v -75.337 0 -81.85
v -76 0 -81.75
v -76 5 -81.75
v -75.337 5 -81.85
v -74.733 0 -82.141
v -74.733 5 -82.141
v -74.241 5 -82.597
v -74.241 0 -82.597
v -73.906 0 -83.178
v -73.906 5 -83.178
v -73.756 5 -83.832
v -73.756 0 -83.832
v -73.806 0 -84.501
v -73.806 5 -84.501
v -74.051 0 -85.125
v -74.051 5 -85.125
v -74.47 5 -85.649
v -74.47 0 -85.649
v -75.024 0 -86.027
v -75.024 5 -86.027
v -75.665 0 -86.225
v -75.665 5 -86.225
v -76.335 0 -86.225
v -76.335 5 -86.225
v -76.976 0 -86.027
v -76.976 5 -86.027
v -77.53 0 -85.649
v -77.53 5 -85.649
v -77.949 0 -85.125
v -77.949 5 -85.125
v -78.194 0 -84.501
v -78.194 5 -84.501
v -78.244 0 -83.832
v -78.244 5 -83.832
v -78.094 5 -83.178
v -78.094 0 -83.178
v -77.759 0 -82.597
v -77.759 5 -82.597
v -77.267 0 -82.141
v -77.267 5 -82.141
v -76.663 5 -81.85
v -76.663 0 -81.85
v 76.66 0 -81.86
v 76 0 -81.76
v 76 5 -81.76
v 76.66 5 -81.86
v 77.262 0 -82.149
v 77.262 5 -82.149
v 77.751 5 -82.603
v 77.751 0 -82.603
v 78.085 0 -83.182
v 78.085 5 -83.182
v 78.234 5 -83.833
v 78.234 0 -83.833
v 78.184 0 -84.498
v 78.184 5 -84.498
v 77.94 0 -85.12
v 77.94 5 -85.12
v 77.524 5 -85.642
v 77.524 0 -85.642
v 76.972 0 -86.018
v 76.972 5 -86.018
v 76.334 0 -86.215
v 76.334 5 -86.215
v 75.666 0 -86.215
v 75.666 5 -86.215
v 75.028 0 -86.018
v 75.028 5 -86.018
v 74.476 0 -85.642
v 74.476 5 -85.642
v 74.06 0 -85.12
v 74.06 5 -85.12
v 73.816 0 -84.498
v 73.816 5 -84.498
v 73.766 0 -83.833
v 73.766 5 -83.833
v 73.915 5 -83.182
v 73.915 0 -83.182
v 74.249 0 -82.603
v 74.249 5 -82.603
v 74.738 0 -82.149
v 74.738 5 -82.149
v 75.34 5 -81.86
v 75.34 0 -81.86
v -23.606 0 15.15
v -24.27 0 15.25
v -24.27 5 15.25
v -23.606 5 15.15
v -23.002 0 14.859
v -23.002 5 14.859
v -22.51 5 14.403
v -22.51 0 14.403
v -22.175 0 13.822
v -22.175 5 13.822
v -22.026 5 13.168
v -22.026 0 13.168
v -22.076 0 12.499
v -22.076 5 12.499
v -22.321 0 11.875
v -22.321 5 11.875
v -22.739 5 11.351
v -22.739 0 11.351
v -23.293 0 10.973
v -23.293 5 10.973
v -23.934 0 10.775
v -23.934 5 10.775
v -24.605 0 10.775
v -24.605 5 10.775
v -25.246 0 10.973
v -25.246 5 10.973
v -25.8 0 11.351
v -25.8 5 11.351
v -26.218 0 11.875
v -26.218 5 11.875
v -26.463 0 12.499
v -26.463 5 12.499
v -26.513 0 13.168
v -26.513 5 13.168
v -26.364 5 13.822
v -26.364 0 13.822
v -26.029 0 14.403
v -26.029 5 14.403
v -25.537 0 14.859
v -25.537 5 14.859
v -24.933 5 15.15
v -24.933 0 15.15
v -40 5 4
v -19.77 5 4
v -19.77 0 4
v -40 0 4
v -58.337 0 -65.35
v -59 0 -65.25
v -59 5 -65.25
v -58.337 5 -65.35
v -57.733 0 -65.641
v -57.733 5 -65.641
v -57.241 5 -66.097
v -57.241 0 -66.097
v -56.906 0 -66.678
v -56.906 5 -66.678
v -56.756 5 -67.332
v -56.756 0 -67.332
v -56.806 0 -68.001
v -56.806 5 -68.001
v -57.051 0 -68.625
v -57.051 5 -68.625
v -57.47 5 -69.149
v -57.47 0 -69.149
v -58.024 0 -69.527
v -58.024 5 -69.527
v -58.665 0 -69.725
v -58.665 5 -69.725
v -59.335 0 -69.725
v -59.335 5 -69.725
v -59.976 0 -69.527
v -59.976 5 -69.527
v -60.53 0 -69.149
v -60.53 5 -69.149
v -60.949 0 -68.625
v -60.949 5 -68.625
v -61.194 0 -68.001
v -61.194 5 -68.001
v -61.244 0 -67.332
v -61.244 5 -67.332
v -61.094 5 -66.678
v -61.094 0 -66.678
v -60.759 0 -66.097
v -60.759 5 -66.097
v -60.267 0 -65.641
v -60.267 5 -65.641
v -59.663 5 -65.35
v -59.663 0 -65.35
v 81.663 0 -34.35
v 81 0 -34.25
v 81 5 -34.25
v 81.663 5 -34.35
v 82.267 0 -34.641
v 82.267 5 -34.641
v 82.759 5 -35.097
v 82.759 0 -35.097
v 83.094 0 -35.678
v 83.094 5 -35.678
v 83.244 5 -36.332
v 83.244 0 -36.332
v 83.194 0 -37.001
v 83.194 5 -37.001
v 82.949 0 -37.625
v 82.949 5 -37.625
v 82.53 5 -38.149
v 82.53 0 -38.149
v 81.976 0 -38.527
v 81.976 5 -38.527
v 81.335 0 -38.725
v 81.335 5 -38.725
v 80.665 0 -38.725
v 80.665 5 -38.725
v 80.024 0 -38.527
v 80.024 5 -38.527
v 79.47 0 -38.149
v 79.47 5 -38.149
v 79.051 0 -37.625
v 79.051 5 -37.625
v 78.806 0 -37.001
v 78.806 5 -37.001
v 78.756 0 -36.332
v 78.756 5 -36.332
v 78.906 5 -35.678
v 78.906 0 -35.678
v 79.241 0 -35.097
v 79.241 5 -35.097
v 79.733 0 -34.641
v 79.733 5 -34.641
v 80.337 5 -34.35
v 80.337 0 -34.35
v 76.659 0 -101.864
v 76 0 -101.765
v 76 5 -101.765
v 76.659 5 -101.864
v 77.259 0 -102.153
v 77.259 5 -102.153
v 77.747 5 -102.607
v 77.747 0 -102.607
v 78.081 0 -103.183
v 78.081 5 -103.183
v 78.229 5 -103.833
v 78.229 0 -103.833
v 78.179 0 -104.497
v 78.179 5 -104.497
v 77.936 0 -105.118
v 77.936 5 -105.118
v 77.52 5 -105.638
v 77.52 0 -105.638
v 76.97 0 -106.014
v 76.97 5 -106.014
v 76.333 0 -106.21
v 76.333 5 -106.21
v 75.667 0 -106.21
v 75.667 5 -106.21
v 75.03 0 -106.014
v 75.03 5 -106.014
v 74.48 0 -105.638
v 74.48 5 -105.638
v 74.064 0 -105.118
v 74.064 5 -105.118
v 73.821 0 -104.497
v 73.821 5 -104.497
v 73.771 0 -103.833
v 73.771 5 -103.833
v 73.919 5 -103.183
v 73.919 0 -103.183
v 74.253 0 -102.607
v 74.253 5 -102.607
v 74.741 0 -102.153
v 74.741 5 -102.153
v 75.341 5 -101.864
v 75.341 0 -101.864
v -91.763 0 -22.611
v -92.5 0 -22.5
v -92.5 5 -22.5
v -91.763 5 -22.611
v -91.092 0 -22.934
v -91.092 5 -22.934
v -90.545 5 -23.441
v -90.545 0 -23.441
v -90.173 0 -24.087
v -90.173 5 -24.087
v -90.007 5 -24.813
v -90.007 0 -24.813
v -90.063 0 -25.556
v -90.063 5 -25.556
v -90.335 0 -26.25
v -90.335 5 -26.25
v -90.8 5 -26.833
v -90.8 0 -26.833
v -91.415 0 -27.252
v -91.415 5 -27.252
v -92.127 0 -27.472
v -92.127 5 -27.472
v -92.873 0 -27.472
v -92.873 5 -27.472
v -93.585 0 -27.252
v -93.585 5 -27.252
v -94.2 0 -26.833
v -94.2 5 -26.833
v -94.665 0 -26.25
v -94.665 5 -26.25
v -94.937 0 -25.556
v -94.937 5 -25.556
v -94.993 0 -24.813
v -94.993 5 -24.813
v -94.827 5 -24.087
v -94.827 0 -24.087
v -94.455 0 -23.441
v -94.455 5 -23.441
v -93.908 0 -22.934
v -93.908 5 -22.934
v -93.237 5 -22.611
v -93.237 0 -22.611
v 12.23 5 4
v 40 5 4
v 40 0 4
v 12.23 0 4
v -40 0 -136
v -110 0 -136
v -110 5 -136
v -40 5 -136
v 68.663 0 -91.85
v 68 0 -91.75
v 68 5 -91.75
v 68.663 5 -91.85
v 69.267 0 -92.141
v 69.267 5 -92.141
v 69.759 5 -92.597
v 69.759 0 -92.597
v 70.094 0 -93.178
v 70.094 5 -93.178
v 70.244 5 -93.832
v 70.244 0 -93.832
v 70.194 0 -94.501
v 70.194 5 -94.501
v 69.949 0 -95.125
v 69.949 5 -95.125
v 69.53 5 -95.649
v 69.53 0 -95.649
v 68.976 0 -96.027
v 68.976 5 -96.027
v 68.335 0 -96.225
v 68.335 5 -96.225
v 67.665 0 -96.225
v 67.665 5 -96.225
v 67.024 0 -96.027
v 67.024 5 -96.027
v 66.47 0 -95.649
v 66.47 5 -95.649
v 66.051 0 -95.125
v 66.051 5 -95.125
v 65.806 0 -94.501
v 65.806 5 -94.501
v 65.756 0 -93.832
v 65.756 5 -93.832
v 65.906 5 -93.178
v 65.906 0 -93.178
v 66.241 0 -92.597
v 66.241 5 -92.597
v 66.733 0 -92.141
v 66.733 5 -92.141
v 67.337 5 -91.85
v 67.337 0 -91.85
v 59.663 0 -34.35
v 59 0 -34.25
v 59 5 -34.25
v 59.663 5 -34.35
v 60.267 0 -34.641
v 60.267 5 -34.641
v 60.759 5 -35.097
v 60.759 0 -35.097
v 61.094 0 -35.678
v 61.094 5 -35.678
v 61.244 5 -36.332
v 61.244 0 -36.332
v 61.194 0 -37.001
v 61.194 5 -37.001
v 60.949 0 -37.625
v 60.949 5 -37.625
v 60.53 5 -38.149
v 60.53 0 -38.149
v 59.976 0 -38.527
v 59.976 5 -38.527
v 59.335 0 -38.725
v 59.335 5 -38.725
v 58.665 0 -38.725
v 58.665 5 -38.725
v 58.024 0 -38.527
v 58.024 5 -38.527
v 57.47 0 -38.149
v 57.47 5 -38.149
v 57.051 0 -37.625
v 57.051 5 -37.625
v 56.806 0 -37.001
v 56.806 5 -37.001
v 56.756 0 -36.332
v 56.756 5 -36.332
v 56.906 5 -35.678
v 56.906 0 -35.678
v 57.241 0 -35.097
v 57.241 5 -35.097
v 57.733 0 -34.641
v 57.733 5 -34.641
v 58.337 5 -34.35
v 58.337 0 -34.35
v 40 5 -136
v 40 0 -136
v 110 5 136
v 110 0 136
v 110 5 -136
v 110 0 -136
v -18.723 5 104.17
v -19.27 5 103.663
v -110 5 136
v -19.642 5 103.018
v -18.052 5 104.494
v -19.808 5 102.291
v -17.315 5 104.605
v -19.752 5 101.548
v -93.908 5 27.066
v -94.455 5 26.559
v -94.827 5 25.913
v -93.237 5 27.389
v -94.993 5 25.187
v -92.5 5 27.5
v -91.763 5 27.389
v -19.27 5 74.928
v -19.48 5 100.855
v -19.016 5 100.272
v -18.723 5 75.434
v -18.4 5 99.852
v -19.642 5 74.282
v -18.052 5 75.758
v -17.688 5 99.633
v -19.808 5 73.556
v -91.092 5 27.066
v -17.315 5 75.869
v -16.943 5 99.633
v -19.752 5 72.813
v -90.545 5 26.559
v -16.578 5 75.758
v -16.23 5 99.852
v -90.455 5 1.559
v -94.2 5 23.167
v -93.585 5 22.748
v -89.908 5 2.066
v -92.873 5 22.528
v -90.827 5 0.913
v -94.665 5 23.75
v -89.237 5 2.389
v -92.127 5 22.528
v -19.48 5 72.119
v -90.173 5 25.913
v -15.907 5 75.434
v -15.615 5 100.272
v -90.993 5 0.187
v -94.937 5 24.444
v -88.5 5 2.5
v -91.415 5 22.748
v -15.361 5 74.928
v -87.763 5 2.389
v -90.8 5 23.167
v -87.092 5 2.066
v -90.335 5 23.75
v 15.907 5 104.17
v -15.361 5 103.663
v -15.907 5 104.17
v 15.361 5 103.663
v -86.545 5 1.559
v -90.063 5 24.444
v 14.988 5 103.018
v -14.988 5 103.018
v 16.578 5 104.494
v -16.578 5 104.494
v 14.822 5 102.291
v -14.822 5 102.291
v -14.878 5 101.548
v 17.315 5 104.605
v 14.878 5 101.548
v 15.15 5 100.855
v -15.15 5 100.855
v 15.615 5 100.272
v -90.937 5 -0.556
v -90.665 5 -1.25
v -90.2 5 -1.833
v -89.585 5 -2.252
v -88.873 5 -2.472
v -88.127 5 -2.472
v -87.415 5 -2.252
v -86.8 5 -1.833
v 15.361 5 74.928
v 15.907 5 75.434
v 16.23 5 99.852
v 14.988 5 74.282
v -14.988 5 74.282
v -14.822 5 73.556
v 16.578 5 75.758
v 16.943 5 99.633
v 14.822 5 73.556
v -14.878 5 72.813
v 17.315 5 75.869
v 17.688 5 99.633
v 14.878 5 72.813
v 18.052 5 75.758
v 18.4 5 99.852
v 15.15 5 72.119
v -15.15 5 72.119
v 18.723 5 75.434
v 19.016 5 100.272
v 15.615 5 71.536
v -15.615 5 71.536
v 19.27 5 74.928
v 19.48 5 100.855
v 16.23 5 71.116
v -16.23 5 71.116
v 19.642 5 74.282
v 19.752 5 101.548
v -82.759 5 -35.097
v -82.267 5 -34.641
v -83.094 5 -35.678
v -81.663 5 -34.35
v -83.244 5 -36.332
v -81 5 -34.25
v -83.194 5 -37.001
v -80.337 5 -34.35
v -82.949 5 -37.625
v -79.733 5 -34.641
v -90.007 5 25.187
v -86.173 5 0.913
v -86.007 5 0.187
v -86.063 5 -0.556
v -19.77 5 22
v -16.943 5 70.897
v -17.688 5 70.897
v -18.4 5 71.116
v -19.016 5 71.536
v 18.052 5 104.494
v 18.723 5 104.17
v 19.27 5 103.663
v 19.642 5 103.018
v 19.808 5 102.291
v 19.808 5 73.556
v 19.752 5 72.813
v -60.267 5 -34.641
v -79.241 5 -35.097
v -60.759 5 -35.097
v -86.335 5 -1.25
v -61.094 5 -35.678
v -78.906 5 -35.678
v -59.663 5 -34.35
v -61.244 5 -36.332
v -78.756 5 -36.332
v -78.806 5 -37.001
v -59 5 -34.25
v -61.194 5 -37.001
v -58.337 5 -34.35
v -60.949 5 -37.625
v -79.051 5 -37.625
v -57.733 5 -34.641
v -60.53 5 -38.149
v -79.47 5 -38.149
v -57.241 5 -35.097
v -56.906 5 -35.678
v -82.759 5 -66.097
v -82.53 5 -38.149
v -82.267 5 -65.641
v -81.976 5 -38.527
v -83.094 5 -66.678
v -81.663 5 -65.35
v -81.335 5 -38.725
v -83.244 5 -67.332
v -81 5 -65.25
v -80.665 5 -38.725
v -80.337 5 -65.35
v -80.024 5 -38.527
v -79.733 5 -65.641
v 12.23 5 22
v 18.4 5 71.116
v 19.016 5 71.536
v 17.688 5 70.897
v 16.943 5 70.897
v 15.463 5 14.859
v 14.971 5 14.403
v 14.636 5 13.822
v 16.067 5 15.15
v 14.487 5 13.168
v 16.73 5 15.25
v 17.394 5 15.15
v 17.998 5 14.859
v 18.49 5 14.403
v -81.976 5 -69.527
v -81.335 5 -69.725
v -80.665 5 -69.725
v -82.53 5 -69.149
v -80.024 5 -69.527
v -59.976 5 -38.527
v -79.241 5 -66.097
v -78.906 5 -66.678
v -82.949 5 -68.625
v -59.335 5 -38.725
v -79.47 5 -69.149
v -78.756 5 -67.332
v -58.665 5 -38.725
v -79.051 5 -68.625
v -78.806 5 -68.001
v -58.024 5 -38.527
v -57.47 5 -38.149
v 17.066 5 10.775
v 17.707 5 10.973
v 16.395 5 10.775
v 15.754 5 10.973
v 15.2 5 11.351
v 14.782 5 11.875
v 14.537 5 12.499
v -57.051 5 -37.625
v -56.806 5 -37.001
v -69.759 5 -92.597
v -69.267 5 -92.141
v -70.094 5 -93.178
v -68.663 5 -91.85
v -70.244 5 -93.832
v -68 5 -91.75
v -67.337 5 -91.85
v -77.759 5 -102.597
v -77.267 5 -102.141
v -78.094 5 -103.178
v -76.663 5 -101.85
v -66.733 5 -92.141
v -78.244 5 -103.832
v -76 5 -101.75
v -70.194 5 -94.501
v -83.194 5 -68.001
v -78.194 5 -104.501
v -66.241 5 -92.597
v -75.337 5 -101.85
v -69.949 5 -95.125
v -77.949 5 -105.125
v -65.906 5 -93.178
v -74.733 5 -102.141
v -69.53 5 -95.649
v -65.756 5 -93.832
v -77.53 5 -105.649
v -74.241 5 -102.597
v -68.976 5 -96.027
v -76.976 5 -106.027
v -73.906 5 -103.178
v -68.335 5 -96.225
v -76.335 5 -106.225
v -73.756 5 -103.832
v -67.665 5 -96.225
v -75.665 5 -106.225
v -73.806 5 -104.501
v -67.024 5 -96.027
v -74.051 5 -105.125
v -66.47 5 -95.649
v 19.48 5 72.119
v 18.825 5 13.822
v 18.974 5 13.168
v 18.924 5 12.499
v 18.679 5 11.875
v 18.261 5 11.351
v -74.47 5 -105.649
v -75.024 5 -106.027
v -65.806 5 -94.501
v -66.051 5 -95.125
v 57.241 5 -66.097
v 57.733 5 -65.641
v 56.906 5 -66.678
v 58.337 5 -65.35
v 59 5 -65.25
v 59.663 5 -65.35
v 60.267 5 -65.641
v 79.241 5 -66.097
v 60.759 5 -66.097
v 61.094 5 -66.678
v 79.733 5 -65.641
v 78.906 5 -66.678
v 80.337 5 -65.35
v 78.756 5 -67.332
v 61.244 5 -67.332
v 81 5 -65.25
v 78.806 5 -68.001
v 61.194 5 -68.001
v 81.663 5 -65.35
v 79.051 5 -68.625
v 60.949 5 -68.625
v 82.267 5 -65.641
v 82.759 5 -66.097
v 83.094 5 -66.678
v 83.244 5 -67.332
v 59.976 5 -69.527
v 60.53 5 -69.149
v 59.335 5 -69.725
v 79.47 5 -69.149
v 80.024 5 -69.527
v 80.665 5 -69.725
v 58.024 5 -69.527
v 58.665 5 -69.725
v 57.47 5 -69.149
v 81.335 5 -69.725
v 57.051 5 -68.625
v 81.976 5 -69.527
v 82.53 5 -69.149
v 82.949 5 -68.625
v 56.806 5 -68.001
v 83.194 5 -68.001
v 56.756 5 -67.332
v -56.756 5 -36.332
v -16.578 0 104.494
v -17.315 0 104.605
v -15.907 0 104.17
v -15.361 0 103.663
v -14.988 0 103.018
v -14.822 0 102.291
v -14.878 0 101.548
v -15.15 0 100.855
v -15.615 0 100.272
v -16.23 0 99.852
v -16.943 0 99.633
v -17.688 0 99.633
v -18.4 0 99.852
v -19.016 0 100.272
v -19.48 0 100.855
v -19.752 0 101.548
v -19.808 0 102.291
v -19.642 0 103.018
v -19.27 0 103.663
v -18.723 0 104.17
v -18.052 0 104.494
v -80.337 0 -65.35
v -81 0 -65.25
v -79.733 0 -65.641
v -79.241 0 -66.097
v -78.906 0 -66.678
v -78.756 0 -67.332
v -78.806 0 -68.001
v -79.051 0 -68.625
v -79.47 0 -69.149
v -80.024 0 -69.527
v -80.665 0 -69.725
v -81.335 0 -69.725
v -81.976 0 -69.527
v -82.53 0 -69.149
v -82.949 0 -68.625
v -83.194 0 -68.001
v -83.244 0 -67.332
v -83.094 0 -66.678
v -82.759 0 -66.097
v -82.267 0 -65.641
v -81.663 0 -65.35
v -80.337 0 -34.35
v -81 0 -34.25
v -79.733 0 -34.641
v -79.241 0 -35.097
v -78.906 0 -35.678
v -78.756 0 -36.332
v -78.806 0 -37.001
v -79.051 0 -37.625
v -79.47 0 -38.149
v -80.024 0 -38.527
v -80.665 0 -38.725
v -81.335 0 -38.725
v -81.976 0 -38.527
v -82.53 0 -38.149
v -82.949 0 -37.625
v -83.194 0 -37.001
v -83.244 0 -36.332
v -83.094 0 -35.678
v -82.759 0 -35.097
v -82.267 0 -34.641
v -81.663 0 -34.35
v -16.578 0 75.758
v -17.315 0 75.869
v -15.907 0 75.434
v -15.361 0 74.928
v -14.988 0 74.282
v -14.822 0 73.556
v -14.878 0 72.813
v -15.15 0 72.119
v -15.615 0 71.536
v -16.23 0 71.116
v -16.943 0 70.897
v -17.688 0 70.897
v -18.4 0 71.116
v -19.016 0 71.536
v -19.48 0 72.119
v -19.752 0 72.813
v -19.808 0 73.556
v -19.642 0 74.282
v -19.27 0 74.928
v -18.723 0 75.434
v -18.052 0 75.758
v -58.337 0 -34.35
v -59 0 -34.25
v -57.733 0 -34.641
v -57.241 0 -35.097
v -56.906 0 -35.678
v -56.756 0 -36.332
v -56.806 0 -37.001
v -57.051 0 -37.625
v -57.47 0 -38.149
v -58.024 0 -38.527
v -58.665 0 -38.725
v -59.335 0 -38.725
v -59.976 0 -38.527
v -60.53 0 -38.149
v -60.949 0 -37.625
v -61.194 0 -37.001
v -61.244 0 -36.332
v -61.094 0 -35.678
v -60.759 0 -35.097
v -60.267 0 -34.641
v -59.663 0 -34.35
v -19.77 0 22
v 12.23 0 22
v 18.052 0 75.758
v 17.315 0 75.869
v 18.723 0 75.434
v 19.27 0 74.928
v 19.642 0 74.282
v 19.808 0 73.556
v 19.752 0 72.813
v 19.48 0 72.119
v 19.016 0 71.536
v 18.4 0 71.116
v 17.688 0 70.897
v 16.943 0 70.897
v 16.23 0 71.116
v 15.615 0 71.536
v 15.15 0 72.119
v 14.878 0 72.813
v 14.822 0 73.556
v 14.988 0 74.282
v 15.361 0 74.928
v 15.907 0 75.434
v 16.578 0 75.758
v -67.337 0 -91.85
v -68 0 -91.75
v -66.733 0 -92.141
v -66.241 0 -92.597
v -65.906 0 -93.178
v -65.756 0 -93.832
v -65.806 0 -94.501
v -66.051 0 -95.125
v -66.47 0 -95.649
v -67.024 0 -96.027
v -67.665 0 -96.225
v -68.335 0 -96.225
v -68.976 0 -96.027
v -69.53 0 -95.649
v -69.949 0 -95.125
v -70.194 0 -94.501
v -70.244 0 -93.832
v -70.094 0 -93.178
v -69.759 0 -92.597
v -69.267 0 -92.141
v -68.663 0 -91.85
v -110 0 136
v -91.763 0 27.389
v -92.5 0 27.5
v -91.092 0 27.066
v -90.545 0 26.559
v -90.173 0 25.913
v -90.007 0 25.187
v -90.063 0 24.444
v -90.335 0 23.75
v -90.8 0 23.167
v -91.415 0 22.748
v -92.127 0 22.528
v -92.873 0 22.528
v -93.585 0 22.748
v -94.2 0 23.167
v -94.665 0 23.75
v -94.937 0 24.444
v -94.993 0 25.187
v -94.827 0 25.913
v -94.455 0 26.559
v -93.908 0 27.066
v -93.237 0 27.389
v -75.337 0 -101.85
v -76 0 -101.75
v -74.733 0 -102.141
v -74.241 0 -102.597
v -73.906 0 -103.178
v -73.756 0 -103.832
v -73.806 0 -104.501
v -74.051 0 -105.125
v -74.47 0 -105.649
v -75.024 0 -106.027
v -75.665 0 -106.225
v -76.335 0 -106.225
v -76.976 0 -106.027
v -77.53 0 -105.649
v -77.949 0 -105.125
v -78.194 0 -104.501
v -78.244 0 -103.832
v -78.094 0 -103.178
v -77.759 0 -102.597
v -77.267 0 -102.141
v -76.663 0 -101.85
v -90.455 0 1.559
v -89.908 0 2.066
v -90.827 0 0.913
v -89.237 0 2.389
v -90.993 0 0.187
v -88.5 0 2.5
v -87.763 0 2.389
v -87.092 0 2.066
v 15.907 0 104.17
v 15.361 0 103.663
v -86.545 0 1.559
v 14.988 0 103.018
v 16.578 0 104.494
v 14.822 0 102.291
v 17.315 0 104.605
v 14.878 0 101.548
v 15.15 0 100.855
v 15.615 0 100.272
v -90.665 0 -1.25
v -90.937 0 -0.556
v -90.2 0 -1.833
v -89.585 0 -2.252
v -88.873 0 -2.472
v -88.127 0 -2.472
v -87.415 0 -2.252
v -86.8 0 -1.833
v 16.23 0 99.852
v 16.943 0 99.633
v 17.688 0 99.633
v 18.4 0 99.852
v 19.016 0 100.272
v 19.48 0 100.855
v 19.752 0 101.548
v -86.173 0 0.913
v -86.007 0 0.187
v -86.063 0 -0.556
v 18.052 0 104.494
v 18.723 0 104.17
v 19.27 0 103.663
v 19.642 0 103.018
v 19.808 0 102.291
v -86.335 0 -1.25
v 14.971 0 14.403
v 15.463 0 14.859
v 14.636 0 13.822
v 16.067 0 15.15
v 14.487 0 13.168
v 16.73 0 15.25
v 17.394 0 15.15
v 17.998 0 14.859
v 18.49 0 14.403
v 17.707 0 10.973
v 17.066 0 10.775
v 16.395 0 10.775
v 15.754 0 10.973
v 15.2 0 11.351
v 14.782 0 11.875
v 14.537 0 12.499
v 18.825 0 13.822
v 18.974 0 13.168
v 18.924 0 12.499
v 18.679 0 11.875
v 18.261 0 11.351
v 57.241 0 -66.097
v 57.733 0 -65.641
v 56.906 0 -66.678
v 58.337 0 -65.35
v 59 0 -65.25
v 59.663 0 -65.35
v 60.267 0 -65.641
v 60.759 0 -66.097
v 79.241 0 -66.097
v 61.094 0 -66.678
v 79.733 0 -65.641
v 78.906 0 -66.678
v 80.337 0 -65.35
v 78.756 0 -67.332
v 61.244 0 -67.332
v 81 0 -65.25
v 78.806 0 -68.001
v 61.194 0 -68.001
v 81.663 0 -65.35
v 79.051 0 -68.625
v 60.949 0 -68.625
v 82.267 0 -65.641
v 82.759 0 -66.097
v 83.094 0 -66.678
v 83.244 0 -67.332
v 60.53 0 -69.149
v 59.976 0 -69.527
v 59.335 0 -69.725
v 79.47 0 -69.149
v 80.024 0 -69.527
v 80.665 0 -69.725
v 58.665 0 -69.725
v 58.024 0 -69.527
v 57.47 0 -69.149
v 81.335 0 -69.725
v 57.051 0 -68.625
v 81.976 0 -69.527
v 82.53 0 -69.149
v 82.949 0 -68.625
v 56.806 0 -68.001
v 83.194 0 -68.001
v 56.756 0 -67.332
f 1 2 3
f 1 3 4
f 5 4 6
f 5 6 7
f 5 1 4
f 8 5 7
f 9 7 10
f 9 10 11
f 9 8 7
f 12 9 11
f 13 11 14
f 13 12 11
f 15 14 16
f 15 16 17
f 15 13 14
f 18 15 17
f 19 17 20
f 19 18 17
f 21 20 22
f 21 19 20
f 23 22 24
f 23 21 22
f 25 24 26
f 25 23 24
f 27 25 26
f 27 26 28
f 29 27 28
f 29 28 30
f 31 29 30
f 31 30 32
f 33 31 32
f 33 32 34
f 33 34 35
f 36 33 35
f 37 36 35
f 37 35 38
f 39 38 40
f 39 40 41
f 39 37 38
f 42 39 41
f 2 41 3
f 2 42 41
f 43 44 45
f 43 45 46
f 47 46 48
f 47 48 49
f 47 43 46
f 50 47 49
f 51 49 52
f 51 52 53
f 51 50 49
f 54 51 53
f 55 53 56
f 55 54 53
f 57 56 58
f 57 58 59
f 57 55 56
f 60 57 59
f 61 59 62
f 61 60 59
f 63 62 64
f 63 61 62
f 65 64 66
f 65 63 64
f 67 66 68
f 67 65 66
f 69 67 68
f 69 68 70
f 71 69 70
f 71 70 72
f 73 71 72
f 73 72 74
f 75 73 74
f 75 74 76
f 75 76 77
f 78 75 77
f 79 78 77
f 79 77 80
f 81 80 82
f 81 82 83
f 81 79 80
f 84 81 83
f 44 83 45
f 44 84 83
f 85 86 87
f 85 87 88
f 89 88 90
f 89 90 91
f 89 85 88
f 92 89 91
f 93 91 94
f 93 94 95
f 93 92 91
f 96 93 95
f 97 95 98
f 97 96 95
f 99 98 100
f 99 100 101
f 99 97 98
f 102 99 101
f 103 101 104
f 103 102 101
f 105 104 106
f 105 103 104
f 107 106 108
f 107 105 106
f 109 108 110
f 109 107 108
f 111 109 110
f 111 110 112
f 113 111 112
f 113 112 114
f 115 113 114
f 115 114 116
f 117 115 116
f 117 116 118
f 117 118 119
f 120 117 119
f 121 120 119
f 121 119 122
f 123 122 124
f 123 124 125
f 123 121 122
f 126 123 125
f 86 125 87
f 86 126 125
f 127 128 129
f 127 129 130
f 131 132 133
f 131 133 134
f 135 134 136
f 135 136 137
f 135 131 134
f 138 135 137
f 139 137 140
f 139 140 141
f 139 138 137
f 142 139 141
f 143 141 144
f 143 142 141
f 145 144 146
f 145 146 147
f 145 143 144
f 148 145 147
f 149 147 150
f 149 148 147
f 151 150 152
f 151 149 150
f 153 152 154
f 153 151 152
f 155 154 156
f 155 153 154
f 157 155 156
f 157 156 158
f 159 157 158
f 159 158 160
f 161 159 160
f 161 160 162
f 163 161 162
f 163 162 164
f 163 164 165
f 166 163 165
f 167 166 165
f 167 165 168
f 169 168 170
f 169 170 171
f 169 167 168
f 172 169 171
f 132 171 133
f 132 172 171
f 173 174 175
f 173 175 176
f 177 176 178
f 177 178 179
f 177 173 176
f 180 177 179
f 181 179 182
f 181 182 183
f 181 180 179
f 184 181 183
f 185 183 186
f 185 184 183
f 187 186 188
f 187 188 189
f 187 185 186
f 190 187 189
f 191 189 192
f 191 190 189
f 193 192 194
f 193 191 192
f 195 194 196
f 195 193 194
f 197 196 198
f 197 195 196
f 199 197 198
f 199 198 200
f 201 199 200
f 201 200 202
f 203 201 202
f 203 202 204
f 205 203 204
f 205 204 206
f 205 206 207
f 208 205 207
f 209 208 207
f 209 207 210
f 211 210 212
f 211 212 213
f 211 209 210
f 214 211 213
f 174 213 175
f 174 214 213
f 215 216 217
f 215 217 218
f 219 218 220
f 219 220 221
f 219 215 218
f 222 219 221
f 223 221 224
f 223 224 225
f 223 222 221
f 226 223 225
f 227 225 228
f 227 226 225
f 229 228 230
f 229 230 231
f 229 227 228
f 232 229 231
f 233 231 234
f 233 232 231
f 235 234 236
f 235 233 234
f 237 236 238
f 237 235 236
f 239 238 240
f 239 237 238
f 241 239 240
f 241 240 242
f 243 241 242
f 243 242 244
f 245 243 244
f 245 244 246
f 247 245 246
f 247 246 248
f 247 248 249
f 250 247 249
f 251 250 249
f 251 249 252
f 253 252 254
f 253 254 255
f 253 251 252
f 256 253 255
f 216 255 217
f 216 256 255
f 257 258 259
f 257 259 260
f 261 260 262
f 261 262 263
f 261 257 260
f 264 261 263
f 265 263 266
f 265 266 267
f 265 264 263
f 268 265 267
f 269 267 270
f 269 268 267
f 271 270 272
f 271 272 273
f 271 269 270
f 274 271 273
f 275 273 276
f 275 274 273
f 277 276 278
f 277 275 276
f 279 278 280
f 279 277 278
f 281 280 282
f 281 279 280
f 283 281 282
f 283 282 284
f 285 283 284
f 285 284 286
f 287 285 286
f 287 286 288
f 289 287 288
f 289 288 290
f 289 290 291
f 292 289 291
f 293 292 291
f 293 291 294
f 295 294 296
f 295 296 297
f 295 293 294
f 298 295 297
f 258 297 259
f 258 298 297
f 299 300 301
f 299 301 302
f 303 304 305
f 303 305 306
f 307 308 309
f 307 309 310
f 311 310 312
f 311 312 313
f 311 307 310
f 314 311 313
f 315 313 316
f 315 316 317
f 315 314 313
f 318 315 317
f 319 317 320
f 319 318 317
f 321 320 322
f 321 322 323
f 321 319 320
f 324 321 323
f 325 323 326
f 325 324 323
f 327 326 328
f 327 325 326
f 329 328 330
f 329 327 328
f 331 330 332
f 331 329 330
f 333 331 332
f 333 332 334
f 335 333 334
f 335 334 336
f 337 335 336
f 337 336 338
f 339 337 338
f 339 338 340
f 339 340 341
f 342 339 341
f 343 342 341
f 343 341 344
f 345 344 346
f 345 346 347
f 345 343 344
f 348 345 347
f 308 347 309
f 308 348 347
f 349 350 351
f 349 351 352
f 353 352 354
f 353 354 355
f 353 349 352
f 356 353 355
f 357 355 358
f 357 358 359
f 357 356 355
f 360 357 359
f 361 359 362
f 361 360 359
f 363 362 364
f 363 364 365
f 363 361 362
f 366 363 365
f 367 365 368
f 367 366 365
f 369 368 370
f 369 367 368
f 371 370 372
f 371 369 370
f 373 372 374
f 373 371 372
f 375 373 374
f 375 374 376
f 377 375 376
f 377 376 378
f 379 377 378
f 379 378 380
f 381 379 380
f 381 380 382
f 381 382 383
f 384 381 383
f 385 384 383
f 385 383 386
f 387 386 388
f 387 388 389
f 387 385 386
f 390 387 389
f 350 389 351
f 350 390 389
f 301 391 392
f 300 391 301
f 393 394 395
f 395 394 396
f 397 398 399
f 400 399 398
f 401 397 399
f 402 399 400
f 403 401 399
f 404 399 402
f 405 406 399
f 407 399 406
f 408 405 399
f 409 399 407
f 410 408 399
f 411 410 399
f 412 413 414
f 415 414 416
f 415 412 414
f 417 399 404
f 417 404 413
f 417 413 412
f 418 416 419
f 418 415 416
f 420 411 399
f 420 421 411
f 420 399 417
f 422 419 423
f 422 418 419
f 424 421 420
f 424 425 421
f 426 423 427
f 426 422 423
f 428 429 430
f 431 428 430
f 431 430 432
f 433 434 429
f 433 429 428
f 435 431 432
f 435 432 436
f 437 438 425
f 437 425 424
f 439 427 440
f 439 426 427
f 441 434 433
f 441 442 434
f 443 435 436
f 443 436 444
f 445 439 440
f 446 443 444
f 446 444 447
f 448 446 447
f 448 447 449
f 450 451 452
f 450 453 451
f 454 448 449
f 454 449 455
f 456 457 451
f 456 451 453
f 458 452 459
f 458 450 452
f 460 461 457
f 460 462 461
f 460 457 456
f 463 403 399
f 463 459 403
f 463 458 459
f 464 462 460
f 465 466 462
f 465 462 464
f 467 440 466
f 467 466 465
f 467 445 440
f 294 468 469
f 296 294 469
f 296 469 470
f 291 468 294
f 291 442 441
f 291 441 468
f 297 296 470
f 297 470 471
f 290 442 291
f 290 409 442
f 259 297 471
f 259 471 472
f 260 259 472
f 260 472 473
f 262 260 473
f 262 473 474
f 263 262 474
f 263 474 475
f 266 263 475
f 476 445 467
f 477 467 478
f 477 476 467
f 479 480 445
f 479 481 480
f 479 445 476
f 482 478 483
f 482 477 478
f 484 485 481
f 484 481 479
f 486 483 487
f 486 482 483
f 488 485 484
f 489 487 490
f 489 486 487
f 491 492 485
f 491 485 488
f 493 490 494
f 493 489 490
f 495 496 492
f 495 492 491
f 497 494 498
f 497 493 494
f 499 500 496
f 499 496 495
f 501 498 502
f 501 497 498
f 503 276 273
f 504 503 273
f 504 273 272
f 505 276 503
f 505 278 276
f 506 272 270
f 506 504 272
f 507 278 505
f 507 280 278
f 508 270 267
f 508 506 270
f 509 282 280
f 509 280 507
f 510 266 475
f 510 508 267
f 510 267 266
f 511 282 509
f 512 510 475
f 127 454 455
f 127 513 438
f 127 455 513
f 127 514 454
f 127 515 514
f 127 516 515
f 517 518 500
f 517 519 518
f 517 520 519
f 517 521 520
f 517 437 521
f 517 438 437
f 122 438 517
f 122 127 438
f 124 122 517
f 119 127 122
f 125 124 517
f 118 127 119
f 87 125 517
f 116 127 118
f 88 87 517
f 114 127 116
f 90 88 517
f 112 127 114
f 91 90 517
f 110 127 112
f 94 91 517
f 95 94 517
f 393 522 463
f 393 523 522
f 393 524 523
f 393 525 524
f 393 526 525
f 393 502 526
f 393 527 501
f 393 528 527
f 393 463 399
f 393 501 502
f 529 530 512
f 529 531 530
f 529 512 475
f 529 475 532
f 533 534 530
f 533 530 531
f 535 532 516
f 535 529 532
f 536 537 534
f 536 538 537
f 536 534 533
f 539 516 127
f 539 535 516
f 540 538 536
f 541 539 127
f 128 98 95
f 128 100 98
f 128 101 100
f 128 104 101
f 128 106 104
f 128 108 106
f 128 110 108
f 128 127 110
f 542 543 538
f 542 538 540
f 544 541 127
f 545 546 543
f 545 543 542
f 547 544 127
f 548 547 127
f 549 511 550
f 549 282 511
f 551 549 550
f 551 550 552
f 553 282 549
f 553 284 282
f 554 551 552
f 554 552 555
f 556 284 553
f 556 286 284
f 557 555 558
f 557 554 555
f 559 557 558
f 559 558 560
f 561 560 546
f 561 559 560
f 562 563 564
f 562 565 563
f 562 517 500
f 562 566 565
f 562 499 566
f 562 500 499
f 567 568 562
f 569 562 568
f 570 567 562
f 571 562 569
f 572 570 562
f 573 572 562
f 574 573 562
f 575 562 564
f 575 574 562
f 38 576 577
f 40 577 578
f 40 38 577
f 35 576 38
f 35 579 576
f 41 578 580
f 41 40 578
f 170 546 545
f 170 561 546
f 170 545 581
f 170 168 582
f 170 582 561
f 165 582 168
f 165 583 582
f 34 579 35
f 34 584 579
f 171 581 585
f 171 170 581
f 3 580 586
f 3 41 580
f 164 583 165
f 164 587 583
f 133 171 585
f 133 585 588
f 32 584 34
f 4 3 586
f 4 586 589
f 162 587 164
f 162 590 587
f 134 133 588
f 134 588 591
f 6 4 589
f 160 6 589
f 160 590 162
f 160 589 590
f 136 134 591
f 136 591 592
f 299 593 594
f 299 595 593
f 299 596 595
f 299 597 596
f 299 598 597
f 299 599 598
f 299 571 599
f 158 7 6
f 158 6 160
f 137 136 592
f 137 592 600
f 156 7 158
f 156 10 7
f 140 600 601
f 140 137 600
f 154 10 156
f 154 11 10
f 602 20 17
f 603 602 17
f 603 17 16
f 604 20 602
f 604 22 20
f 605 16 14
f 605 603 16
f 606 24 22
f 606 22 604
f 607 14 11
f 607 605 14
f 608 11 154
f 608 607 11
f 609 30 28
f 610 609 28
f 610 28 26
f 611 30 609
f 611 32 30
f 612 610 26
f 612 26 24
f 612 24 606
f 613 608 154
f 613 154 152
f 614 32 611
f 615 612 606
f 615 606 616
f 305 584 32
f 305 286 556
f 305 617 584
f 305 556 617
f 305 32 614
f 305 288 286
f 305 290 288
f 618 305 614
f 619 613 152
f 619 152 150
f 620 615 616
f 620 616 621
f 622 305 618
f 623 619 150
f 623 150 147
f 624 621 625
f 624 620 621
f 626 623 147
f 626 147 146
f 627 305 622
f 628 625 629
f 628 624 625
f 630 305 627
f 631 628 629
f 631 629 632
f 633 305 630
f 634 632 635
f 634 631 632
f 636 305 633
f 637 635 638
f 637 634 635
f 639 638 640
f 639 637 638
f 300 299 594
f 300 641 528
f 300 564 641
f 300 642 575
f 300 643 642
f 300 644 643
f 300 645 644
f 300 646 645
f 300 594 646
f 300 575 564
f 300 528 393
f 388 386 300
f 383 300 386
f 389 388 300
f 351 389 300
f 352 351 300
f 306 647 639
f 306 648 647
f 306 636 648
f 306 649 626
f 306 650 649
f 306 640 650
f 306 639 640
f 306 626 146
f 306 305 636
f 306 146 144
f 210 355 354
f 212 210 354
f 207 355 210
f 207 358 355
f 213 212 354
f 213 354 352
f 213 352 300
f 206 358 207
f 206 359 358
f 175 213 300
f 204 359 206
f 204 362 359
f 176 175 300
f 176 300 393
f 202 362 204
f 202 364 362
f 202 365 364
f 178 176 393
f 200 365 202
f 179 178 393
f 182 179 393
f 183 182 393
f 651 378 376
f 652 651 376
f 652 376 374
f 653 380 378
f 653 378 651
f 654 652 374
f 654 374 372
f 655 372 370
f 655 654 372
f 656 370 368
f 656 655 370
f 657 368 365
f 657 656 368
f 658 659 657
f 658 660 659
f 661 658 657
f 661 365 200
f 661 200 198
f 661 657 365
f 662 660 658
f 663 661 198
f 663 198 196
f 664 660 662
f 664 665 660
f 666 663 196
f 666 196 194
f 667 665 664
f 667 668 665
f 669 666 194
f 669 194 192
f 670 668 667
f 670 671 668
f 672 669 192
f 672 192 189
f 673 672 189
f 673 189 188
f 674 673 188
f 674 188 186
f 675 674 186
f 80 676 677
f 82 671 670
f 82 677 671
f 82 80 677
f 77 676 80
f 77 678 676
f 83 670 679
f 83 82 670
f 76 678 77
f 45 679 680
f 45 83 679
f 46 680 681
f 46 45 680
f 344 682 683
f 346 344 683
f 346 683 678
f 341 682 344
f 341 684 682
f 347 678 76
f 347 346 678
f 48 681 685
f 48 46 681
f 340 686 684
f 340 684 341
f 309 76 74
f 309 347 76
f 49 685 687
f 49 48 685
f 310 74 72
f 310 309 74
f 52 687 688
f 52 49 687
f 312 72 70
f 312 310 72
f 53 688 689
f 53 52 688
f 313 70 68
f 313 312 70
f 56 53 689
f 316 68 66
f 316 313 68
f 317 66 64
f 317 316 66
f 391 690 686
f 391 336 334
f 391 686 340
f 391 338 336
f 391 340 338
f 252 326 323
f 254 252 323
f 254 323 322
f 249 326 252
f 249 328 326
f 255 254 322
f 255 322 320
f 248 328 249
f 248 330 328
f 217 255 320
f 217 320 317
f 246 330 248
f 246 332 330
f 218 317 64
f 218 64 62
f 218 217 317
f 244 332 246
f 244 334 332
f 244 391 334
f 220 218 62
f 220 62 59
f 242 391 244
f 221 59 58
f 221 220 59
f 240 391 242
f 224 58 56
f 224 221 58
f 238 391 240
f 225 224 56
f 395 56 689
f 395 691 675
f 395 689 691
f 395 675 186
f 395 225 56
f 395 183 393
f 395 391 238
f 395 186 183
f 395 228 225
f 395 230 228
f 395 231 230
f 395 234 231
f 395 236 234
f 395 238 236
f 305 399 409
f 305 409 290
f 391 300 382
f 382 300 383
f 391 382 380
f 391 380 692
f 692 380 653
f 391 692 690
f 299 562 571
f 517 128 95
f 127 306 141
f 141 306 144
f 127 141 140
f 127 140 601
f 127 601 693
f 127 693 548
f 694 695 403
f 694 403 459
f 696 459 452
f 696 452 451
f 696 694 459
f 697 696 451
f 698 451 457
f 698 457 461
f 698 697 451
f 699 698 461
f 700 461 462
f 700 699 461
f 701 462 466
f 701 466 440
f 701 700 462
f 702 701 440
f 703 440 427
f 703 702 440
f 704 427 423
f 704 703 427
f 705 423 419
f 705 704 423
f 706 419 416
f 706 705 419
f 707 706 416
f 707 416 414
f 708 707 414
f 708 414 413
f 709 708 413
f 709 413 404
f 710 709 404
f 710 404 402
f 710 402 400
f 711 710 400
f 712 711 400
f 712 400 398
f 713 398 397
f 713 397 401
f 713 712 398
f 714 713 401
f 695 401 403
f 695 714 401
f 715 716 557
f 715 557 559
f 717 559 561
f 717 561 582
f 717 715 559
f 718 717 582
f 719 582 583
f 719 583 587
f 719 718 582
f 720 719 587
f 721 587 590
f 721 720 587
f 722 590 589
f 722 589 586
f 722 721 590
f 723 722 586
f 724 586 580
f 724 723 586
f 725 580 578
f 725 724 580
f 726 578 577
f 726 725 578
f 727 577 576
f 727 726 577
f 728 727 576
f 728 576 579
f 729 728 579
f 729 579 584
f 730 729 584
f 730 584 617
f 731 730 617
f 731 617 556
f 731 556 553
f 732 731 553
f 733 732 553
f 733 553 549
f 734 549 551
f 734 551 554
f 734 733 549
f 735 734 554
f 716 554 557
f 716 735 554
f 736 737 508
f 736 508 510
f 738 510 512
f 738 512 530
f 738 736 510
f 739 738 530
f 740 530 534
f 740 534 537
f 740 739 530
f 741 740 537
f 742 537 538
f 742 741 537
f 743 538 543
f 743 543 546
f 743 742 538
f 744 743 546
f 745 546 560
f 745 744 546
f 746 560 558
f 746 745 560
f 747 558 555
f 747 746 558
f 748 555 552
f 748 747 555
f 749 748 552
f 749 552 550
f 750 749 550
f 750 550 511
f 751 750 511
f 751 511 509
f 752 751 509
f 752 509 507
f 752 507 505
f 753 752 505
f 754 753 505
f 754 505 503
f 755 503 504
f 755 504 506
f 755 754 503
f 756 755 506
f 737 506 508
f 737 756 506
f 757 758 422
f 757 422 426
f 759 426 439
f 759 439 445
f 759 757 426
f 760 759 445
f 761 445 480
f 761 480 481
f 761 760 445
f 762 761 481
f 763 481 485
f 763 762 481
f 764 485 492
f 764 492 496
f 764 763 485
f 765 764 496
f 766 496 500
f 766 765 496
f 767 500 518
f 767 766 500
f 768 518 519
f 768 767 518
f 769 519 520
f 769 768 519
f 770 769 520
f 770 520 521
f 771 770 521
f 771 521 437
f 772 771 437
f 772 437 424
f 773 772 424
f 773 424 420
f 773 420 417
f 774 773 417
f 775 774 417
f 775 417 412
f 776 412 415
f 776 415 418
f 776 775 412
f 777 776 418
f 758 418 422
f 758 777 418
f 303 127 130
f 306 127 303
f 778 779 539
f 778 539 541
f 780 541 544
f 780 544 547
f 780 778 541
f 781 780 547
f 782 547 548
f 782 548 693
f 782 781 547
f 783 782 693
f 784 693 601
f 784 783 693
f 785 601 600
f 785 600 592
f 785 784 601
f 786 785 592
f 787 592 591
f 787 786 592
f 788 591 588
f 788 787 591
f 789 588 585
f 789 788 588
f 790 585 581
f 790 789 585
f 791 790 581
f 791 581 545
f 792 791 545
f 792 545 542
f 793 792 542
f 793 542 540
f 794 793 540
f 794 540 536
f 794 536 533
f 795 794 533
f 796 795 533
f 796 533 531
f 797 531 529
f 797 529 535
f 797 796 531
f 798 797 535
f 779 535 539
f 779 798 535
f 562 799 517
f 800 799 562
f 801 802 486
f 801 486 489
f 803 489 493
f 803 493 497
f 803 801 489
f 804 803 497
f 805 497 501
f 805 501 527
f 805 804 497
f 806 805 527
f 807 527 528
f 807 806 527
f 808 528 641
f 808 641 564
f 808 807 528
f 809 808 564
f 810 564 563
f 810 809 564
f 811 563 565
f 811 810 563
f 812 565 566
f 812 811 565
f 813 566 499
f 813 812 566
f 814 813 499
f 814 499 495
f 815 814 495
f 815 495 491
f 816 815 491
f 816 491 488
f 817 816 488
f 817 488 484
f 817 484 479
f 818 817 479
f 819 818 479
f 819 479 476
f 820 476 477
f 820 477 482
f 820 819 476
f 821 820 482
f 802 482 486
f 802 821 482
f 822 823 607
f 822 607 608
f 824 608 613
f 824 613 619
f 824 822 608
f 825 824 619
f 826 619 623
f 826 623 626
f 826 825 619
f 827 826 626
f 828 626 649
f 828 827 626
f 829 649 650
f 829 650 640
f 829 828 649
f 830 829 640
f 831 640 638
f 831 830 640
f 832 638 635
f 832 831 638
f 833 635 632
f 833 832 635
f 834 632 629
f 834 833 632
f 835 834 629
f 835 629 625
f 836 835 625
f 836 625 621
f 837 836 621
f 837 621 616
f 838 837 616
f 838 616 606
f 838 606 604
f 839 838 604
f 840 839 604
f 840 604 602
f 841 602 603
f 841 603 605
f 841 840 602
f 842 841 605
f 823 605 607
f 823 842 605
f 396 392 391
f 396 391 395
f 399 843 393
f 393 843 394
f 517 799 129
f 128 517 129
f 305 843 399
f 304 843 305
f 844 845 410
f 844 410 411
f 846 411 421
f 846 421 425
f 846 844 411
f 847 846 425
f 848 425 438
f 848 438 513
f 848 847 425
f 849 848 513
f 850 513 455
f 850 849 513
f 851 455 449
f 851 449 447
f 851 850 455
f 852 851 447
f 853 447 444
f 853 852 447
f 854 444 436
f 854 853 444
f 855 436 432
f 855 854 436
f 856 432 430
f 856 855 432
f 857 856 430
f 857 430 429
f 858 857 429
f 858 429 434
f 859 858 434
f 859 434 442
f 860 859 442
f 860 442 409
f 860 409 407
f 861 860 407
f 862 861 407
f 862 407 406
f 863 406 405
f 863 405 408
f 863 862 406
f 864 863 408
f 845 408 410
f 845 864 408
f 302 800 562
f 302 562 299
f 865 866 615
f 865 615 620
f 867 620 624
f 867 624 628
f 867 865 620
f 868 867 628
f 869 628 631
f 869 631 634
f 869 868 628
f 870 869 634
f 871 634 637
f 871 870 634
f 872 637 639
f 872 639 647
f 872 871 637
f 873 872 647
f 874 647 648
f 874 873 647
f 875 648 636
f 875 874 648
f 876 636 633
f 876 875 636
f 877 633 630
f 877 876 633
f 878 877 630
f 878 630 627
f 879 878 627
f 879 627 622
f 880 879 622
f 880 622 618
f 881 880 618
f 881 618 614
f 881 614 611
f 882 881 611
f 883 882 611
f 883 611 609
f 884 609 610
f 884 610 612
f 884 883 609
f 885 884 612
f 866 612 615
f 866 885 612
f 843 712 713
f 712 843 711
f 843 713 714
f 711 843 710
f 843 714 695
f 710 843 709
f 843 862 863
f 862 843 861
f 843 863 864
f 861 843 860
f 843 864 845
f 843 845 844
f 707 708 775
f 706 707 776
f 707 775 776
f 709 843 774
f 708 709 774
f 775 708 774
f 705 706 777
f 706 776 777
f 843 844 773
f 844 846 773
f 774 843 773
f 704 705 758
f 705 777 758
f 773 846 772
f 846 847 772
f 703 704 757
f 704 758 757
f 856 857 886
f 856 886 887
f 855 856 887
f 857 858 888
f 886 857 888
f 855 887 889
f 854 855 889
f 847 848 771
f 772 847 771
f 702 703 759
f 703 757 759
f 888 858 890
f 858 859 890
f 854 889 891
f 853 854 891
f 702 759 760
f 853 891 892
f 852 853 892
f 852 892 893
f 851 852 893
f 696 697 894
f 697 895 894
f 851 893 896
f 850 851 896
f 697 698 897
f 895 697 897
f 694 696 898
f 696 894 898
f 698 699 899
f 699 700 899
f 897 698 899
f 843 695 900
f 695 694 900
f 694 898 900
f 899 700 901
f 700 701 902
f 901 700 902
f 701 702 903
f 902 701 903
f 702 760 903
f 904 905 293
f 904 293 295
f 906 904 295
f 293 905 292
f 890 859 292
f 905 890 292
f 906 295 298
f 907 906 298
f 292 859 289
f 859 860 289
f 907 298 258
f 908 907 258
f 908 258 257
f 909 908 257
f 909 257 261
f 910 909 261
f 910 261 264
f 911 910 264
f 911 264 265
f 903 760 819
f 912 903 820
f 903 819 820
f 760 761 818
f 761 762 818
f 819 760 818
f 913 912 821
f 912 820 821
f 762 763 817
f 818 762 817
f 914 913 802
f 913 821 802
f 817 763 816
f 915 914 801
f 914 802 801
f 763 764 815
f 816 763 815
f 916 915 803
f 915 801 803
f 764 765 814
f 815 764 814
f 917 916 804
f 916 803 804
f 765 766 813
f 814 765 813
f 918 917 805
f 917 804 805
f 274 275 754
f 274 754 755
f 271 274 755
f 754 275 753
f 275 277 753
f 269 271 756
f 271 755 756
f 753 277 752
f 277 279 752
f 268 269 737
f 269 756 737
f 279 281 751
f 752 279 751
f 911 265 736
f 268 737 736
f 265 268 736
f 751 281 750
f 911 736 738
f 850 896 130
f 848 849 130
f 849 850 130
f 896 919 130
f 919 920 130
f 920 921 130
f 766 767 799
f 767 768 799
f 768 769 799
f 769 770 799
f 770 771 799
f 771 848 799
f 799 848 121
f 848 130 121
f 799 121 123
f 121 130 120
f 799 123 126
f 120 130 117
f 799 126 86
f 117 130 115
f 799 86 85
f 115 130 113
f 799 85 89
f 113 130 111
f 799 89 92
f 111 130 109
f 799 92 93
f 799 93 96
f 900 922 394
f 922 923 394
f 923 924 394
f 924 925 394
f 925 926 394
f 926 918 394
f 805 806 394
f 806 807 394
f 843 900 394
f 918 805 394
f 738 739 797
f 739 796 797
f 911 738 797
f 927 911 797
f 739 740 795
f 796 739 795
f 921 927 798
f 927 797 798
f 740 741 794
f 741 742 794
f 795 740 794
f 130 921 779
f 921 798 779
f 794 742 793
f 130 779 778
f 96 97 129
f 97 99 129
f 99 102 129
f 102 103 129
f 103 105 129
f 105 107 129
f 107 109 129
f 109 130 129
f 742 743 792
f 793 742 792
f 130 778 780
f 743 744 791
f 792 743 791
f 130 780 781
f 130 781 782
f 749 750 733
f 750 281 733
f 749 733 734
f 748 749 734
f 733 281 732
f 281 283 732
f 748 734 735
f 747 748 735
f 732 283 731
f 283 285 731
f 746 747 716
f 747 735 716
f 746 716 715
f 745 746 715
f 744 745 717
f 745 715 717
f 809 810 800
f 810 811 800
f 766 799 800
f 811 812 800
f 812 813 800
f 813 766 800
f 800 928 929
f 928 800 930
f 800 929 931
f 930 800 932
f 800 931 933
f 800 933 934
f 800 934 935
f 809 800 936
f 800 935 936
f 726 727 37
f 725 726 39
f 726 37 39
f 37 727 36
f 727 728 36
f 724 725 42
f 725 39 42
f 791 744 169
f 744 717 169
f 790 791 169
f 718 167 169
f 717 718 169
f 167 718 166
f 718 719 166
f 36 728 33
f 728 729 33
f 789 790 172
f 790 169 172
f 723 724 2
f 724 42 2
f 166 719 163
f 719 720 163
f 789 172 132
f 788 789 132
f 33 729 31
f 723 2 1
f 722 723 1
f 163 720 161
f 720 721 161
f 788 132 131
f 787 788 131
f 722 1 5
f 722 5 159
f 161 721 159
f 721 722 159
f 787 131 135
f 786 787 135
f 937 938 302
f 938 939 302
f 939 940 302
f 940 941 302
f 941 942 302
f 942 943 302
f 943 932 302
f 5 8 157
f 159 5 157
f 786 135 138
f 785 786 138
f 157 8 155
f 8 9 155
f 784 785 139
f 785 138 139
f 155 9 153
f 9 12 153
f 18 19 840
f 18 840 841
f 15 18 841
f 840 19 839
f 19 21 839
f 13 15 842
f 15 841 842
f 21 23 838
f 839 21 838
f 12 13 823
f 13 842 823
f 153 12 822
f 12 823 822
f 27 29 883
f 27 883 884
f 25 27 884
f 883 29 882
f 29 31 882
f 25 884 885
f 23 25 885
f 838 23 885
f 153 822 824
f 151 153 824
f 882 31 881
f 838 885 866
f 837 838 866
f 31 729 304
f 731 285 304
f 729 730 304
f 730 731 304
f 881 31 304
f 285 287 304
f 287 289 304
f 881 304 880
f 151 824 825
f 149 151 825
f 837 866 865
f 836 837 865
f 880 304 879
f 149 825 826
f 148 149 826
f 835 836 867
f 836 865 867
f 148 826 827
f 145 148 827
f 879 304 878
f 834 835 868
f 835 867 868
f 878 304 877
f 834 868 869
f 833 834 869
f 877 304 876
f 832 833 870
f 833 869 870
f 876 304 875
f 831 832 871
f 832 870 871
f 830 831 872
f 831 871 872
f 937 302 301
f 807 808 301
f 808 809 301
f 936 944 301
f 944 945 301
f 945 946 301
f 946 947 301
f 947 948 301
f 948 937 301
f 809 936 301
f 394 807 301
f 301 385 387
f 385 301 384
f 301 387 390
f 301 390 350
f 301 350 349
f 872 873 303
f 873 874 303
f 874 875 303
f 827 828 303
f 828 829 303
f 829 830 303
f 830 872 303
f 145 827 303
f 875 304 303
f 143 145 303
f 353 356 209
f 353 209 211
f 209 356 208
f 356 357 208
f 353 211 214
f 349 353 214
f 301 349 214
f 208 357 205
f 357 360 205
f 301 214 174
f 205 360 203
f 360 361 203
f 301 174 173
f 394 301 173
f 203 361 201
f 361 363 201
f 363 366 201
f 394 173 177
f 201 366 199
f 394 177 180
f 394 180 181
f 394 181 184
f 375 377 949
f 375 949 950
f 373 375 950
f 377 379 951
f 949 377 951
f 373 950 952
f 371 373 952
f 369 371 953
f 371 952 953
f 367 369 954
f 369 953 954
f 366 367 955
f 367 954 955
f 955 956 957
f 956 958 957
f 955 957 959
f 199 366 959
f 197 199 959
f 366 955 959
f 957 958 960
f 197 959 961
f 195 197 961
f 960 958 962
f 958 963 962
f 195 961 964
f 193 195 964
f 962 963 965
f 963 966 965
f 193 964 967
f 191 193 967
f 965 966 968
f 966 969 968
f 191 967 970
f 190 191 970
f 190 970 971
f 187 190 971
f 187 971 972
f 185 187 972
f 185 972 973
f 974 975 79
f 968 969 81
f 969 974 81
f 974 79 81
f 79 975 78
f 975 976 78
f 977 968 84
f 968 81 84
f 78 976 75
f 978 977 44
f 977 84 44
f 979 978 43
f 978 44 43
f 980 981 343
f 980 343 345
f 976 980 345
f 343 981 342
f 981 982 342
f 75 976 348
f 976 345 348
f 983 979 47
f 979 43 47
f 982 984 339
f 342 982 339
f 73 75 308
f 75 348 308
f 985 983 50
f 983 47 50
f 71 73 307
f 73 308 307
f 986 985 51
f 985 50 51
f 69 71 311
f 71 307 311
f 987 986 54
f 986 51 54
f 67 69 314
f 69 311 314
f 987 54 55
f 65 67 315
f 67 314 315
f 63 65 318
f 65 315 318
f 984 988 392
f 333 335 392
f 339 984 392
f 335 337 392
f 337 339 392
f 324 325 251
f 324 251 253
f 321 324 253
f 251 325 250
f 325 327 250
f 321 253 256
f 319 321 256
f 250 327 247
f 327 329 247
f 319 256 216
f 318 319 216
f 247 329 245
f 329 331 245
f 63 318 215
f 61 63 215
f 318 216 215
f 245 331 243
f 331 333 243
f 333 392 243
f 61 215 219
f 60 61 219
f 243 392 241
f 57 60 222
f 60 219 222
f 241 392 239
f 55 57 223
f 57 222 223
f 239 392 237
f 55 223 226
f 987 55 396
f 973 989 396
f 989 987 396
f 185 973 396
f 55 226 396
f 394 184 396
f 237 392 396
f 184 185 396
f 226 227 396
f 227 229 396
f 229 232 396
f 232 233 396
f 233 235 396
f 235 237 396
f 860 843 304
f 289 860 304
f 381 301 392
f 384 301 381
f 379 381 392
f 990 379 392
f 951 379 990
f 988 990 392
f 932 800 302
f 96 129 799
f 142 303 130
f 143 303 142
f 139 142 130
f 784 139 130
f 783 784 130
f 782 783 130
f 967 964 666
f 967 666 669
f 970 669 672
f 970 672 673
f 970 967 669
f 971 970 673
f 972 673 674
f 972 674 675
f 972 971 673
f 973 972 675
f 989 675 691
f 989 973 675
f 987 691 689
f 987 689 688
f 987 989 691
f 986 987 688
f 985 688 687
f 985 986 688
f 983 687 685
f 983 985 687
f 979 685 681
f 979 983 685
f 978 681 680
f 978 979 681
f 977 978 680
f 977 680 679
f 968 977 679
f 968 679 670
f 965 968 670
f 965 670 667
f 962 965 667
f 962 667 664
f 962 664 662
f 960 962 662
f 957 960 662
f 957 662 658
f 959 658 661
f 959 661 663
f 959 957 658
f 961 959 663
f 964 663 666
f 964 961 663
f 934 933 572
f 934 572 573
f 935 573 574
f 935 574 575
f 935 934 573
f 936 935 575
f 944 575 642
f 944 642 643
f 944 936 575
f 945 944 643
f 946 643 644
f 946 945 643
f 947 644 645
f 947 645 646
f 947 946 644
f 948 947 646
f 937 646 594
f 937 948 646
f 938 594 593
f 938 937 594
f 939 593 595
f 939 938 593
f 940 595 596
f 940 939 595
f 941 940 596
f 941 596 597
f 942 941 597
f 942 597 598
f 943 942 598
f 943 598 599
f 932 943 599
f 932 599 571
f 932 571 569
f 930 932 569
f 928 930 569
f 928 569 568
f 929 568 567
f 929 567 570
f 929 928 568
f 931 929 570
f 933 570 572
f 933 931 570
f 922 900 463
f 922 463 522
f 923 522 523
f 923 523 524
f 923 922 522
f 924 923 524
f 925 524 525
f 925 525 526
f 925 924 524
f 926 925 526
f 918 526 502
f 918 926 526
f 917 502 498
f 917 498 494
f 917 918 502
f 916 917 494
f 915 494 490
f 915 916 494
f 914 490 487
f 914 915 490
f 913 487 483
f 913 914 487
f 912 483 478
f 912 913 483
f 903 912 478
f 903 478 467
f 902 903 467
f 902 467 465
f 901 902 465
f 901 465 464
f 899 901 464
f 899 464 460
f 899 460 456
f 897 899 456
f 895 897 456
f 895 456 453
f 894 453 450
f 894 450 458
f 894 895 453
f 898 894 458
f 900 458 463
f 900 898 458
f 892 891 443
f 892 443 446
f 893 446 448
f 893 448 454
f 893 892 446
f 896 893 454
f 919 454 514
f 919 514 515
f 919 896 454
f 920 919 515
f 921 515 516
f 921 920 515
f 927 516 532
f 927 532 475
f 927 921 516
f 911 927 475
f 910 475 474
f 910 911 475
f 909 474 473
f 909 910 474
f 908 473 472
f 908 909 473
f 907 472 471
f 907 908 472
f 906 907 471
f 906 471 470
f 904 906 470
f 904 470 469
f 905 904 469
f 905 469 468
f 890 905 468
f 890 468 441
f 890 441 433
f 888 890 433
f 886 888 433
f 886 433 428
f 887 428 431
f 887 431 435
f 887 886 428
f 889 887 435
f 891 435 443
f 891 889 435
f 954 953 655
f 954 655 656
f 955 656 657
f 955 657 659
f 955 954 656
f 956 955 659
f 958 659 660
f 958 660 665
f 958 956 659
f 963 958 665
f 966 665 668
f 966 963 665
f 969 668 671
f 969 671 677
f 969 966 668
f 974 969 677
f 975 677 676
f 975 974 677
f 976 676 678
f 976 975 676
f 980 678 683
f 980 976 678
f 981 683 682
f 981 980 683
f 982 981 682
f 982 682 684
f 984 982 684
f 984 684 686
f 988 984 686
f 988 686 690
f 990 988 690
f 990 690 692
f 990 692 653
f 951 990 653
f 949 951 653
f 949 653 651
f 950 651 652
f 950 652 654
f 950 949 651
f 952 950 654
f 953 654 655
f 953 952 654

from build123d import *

# Parameters (mm, degrees)
SKETCH1_W           = 220
SKETCH1_H           = 272
SKETCH1_R           = 2.25
SKETCH1_R_2         = 2.235
SKETCH1_R_3         = 2.24
SKETCH1_R_4         = 2.5
SKETCH1_W_2         = 32
SKETCH1_H_2         = 18
BOSS_EXTRUDE1_DEPTH = 5
CUT_EXTRUDE1_DEPTH  = 175.988571055


with BuildPart() as part:
    # Sketch1 → Boss-Extrude1 (new body)
    with BuildSketch(Plane(origin=(0, 0, 0), x_dir=(1, 0, 0), z_dir=(0, 1, 0))):
        Rectangle(SKETCH1_W, SKETCH1_H)
        with Locations(Location((68, 94, 0), (0, 0, 270))):
            Circle(SKETCH1_R, mode=Mode.SUBTRACT)
        with Locations(Location((76, 104, 0), (0, 0, 270))):
            Circle(SKETCH1_R_2, mode=Mode.SUBTRACT)
        with Locations(Location((76, 84, 0), (0, 0, 270))):
            Circle(SKETCH1_R_3, mode=Mode.SUBTRACT)
        with Locations(Location((-76, 84, 0), (0, 0, 270))):
            Circle(SKETCH1_R, mode=Mode.SUBTRACT)
        with Locations(Location((-68, 94, 0), (0, 0, 270))):
            Circle(SKETCH1_R, mode=Mode.SUBTRACT)
        with Locations(Location((-76, 104, 0), (0, 0, 270))):
            Circle(SKETCH1_R, mode=Mode.SUBTRACT)
        with Locations(Location((-81, 67.5, 0), (0, 0, 270))):
            Circle(SKETCH1_R, mode=Mode.SUBTRACT)
        with Locations(Location((-81, 36.5, 0), (0, 0, 270))):
            Circle(SKETCH1_R, mode=Mode.SUBTRACT)
        with Locations(Location((-59, 67.5, 0), (0, 0, 270))):
            Circle(SKETCH1_R, mode=Mode.SUBTRACT)
        with Locations(Location((-59, 36.5, 0), (0, 0, 270))):
            Circle(SKETCH1_R, mode=Mode.SUBTRACT)
        with Locations(Location((59, 36.5, 0), (0, 0, 270))):
            Circle(SKETCH1_R, mode=Mode.SUBTRACT)
        with Locations(Location((59, 67.5, 0), (0, 0, 270))):
            Circle(SKETCH1_R, mode=Mode.SUBTRACT)
        with Locations(Location((81, 67.5, 0), (0, 0, 270))):
            Circle(SKETCH1_R, mode=Mode.SUBTRACT)
        with Locations(Location((81, 36.5, 0), (0, 0, 270))):
            Circle(SKETCH1_R, mode=Mode.SUBTRACT)
        with Locations(Location((-24.269619723, -13, 0), (0, 0, 270))):
            Circle(SKETCH1_R, mode=Mode.SUBTRACT)
        with Locations(Location((16.730380277, -13, 0), (0, 0, 270))):
            Circle(SKETCH1_R, mode=Mode.SUBTRACT)
        with Locations(Location((-17.315138118, -102.104616257, 0), (0, 0, 270))):
            Circle(SKETCH1_R_4, mode=Mode.SUBTRACT)
        with Locations(Location((17.315138118, -102.104616257, 0), (0, 0, 270))):
            Circle(SKETCH1_R_4, mode=Mode.SUBTRACT)
        with Locations(Location((17.315138118, -73.368855125, 0), (0, 0, 270))):
            Circle(SKETCH1_R_4, mode=Mode.SUBTRACT)
        with Locations(Location((-17.315138118, -73.368855125, 0), (0, 0, 270))):
            Circle(SKETCH1_R_4, mode=Mode.SUBTRACT)
        with Locations(Location((-88.5, 0, 0), (0, 0, 270))):
            Circle(SKETCH1_R_4, mode=Mode.SUBTRACT)
        with Locations(Location((-92.5, 25, 0), (0, 0, 270))):
            Circle(SKETCH1_R_4, mode=Mode.SUBTRACT)
        with Locations(Location((-92.5, -25, 0), (0, 0, 270))):
            Circle(SKETCH1_R_4, mode=Mode.SUBTRACT)
        with Locations((-3.769619723, -13)):
            Rectangle(SKETCH1_W_2, SKETCH1_H_2, mode=Mode.SUBTRACT)
    extrude(amount=BOSS_EXTRUDE1_DEPTH)

    # Sketch3 → Cut-Extrude1 (cut, through all)
    with BuildSketch(Plane(origin=(0, 5, 0), x_dir=(1, 0, 0), z_dir=(0, 1, 0))):
        Polygon((0, 136), (40, 136), (40, -4), (-40, -4), (-40, 136), align=None)
    extrude(amount=-CUT_EXTRUDE1_DEPTH, mode=Mode.SUBTRACT)


solid = part.part
